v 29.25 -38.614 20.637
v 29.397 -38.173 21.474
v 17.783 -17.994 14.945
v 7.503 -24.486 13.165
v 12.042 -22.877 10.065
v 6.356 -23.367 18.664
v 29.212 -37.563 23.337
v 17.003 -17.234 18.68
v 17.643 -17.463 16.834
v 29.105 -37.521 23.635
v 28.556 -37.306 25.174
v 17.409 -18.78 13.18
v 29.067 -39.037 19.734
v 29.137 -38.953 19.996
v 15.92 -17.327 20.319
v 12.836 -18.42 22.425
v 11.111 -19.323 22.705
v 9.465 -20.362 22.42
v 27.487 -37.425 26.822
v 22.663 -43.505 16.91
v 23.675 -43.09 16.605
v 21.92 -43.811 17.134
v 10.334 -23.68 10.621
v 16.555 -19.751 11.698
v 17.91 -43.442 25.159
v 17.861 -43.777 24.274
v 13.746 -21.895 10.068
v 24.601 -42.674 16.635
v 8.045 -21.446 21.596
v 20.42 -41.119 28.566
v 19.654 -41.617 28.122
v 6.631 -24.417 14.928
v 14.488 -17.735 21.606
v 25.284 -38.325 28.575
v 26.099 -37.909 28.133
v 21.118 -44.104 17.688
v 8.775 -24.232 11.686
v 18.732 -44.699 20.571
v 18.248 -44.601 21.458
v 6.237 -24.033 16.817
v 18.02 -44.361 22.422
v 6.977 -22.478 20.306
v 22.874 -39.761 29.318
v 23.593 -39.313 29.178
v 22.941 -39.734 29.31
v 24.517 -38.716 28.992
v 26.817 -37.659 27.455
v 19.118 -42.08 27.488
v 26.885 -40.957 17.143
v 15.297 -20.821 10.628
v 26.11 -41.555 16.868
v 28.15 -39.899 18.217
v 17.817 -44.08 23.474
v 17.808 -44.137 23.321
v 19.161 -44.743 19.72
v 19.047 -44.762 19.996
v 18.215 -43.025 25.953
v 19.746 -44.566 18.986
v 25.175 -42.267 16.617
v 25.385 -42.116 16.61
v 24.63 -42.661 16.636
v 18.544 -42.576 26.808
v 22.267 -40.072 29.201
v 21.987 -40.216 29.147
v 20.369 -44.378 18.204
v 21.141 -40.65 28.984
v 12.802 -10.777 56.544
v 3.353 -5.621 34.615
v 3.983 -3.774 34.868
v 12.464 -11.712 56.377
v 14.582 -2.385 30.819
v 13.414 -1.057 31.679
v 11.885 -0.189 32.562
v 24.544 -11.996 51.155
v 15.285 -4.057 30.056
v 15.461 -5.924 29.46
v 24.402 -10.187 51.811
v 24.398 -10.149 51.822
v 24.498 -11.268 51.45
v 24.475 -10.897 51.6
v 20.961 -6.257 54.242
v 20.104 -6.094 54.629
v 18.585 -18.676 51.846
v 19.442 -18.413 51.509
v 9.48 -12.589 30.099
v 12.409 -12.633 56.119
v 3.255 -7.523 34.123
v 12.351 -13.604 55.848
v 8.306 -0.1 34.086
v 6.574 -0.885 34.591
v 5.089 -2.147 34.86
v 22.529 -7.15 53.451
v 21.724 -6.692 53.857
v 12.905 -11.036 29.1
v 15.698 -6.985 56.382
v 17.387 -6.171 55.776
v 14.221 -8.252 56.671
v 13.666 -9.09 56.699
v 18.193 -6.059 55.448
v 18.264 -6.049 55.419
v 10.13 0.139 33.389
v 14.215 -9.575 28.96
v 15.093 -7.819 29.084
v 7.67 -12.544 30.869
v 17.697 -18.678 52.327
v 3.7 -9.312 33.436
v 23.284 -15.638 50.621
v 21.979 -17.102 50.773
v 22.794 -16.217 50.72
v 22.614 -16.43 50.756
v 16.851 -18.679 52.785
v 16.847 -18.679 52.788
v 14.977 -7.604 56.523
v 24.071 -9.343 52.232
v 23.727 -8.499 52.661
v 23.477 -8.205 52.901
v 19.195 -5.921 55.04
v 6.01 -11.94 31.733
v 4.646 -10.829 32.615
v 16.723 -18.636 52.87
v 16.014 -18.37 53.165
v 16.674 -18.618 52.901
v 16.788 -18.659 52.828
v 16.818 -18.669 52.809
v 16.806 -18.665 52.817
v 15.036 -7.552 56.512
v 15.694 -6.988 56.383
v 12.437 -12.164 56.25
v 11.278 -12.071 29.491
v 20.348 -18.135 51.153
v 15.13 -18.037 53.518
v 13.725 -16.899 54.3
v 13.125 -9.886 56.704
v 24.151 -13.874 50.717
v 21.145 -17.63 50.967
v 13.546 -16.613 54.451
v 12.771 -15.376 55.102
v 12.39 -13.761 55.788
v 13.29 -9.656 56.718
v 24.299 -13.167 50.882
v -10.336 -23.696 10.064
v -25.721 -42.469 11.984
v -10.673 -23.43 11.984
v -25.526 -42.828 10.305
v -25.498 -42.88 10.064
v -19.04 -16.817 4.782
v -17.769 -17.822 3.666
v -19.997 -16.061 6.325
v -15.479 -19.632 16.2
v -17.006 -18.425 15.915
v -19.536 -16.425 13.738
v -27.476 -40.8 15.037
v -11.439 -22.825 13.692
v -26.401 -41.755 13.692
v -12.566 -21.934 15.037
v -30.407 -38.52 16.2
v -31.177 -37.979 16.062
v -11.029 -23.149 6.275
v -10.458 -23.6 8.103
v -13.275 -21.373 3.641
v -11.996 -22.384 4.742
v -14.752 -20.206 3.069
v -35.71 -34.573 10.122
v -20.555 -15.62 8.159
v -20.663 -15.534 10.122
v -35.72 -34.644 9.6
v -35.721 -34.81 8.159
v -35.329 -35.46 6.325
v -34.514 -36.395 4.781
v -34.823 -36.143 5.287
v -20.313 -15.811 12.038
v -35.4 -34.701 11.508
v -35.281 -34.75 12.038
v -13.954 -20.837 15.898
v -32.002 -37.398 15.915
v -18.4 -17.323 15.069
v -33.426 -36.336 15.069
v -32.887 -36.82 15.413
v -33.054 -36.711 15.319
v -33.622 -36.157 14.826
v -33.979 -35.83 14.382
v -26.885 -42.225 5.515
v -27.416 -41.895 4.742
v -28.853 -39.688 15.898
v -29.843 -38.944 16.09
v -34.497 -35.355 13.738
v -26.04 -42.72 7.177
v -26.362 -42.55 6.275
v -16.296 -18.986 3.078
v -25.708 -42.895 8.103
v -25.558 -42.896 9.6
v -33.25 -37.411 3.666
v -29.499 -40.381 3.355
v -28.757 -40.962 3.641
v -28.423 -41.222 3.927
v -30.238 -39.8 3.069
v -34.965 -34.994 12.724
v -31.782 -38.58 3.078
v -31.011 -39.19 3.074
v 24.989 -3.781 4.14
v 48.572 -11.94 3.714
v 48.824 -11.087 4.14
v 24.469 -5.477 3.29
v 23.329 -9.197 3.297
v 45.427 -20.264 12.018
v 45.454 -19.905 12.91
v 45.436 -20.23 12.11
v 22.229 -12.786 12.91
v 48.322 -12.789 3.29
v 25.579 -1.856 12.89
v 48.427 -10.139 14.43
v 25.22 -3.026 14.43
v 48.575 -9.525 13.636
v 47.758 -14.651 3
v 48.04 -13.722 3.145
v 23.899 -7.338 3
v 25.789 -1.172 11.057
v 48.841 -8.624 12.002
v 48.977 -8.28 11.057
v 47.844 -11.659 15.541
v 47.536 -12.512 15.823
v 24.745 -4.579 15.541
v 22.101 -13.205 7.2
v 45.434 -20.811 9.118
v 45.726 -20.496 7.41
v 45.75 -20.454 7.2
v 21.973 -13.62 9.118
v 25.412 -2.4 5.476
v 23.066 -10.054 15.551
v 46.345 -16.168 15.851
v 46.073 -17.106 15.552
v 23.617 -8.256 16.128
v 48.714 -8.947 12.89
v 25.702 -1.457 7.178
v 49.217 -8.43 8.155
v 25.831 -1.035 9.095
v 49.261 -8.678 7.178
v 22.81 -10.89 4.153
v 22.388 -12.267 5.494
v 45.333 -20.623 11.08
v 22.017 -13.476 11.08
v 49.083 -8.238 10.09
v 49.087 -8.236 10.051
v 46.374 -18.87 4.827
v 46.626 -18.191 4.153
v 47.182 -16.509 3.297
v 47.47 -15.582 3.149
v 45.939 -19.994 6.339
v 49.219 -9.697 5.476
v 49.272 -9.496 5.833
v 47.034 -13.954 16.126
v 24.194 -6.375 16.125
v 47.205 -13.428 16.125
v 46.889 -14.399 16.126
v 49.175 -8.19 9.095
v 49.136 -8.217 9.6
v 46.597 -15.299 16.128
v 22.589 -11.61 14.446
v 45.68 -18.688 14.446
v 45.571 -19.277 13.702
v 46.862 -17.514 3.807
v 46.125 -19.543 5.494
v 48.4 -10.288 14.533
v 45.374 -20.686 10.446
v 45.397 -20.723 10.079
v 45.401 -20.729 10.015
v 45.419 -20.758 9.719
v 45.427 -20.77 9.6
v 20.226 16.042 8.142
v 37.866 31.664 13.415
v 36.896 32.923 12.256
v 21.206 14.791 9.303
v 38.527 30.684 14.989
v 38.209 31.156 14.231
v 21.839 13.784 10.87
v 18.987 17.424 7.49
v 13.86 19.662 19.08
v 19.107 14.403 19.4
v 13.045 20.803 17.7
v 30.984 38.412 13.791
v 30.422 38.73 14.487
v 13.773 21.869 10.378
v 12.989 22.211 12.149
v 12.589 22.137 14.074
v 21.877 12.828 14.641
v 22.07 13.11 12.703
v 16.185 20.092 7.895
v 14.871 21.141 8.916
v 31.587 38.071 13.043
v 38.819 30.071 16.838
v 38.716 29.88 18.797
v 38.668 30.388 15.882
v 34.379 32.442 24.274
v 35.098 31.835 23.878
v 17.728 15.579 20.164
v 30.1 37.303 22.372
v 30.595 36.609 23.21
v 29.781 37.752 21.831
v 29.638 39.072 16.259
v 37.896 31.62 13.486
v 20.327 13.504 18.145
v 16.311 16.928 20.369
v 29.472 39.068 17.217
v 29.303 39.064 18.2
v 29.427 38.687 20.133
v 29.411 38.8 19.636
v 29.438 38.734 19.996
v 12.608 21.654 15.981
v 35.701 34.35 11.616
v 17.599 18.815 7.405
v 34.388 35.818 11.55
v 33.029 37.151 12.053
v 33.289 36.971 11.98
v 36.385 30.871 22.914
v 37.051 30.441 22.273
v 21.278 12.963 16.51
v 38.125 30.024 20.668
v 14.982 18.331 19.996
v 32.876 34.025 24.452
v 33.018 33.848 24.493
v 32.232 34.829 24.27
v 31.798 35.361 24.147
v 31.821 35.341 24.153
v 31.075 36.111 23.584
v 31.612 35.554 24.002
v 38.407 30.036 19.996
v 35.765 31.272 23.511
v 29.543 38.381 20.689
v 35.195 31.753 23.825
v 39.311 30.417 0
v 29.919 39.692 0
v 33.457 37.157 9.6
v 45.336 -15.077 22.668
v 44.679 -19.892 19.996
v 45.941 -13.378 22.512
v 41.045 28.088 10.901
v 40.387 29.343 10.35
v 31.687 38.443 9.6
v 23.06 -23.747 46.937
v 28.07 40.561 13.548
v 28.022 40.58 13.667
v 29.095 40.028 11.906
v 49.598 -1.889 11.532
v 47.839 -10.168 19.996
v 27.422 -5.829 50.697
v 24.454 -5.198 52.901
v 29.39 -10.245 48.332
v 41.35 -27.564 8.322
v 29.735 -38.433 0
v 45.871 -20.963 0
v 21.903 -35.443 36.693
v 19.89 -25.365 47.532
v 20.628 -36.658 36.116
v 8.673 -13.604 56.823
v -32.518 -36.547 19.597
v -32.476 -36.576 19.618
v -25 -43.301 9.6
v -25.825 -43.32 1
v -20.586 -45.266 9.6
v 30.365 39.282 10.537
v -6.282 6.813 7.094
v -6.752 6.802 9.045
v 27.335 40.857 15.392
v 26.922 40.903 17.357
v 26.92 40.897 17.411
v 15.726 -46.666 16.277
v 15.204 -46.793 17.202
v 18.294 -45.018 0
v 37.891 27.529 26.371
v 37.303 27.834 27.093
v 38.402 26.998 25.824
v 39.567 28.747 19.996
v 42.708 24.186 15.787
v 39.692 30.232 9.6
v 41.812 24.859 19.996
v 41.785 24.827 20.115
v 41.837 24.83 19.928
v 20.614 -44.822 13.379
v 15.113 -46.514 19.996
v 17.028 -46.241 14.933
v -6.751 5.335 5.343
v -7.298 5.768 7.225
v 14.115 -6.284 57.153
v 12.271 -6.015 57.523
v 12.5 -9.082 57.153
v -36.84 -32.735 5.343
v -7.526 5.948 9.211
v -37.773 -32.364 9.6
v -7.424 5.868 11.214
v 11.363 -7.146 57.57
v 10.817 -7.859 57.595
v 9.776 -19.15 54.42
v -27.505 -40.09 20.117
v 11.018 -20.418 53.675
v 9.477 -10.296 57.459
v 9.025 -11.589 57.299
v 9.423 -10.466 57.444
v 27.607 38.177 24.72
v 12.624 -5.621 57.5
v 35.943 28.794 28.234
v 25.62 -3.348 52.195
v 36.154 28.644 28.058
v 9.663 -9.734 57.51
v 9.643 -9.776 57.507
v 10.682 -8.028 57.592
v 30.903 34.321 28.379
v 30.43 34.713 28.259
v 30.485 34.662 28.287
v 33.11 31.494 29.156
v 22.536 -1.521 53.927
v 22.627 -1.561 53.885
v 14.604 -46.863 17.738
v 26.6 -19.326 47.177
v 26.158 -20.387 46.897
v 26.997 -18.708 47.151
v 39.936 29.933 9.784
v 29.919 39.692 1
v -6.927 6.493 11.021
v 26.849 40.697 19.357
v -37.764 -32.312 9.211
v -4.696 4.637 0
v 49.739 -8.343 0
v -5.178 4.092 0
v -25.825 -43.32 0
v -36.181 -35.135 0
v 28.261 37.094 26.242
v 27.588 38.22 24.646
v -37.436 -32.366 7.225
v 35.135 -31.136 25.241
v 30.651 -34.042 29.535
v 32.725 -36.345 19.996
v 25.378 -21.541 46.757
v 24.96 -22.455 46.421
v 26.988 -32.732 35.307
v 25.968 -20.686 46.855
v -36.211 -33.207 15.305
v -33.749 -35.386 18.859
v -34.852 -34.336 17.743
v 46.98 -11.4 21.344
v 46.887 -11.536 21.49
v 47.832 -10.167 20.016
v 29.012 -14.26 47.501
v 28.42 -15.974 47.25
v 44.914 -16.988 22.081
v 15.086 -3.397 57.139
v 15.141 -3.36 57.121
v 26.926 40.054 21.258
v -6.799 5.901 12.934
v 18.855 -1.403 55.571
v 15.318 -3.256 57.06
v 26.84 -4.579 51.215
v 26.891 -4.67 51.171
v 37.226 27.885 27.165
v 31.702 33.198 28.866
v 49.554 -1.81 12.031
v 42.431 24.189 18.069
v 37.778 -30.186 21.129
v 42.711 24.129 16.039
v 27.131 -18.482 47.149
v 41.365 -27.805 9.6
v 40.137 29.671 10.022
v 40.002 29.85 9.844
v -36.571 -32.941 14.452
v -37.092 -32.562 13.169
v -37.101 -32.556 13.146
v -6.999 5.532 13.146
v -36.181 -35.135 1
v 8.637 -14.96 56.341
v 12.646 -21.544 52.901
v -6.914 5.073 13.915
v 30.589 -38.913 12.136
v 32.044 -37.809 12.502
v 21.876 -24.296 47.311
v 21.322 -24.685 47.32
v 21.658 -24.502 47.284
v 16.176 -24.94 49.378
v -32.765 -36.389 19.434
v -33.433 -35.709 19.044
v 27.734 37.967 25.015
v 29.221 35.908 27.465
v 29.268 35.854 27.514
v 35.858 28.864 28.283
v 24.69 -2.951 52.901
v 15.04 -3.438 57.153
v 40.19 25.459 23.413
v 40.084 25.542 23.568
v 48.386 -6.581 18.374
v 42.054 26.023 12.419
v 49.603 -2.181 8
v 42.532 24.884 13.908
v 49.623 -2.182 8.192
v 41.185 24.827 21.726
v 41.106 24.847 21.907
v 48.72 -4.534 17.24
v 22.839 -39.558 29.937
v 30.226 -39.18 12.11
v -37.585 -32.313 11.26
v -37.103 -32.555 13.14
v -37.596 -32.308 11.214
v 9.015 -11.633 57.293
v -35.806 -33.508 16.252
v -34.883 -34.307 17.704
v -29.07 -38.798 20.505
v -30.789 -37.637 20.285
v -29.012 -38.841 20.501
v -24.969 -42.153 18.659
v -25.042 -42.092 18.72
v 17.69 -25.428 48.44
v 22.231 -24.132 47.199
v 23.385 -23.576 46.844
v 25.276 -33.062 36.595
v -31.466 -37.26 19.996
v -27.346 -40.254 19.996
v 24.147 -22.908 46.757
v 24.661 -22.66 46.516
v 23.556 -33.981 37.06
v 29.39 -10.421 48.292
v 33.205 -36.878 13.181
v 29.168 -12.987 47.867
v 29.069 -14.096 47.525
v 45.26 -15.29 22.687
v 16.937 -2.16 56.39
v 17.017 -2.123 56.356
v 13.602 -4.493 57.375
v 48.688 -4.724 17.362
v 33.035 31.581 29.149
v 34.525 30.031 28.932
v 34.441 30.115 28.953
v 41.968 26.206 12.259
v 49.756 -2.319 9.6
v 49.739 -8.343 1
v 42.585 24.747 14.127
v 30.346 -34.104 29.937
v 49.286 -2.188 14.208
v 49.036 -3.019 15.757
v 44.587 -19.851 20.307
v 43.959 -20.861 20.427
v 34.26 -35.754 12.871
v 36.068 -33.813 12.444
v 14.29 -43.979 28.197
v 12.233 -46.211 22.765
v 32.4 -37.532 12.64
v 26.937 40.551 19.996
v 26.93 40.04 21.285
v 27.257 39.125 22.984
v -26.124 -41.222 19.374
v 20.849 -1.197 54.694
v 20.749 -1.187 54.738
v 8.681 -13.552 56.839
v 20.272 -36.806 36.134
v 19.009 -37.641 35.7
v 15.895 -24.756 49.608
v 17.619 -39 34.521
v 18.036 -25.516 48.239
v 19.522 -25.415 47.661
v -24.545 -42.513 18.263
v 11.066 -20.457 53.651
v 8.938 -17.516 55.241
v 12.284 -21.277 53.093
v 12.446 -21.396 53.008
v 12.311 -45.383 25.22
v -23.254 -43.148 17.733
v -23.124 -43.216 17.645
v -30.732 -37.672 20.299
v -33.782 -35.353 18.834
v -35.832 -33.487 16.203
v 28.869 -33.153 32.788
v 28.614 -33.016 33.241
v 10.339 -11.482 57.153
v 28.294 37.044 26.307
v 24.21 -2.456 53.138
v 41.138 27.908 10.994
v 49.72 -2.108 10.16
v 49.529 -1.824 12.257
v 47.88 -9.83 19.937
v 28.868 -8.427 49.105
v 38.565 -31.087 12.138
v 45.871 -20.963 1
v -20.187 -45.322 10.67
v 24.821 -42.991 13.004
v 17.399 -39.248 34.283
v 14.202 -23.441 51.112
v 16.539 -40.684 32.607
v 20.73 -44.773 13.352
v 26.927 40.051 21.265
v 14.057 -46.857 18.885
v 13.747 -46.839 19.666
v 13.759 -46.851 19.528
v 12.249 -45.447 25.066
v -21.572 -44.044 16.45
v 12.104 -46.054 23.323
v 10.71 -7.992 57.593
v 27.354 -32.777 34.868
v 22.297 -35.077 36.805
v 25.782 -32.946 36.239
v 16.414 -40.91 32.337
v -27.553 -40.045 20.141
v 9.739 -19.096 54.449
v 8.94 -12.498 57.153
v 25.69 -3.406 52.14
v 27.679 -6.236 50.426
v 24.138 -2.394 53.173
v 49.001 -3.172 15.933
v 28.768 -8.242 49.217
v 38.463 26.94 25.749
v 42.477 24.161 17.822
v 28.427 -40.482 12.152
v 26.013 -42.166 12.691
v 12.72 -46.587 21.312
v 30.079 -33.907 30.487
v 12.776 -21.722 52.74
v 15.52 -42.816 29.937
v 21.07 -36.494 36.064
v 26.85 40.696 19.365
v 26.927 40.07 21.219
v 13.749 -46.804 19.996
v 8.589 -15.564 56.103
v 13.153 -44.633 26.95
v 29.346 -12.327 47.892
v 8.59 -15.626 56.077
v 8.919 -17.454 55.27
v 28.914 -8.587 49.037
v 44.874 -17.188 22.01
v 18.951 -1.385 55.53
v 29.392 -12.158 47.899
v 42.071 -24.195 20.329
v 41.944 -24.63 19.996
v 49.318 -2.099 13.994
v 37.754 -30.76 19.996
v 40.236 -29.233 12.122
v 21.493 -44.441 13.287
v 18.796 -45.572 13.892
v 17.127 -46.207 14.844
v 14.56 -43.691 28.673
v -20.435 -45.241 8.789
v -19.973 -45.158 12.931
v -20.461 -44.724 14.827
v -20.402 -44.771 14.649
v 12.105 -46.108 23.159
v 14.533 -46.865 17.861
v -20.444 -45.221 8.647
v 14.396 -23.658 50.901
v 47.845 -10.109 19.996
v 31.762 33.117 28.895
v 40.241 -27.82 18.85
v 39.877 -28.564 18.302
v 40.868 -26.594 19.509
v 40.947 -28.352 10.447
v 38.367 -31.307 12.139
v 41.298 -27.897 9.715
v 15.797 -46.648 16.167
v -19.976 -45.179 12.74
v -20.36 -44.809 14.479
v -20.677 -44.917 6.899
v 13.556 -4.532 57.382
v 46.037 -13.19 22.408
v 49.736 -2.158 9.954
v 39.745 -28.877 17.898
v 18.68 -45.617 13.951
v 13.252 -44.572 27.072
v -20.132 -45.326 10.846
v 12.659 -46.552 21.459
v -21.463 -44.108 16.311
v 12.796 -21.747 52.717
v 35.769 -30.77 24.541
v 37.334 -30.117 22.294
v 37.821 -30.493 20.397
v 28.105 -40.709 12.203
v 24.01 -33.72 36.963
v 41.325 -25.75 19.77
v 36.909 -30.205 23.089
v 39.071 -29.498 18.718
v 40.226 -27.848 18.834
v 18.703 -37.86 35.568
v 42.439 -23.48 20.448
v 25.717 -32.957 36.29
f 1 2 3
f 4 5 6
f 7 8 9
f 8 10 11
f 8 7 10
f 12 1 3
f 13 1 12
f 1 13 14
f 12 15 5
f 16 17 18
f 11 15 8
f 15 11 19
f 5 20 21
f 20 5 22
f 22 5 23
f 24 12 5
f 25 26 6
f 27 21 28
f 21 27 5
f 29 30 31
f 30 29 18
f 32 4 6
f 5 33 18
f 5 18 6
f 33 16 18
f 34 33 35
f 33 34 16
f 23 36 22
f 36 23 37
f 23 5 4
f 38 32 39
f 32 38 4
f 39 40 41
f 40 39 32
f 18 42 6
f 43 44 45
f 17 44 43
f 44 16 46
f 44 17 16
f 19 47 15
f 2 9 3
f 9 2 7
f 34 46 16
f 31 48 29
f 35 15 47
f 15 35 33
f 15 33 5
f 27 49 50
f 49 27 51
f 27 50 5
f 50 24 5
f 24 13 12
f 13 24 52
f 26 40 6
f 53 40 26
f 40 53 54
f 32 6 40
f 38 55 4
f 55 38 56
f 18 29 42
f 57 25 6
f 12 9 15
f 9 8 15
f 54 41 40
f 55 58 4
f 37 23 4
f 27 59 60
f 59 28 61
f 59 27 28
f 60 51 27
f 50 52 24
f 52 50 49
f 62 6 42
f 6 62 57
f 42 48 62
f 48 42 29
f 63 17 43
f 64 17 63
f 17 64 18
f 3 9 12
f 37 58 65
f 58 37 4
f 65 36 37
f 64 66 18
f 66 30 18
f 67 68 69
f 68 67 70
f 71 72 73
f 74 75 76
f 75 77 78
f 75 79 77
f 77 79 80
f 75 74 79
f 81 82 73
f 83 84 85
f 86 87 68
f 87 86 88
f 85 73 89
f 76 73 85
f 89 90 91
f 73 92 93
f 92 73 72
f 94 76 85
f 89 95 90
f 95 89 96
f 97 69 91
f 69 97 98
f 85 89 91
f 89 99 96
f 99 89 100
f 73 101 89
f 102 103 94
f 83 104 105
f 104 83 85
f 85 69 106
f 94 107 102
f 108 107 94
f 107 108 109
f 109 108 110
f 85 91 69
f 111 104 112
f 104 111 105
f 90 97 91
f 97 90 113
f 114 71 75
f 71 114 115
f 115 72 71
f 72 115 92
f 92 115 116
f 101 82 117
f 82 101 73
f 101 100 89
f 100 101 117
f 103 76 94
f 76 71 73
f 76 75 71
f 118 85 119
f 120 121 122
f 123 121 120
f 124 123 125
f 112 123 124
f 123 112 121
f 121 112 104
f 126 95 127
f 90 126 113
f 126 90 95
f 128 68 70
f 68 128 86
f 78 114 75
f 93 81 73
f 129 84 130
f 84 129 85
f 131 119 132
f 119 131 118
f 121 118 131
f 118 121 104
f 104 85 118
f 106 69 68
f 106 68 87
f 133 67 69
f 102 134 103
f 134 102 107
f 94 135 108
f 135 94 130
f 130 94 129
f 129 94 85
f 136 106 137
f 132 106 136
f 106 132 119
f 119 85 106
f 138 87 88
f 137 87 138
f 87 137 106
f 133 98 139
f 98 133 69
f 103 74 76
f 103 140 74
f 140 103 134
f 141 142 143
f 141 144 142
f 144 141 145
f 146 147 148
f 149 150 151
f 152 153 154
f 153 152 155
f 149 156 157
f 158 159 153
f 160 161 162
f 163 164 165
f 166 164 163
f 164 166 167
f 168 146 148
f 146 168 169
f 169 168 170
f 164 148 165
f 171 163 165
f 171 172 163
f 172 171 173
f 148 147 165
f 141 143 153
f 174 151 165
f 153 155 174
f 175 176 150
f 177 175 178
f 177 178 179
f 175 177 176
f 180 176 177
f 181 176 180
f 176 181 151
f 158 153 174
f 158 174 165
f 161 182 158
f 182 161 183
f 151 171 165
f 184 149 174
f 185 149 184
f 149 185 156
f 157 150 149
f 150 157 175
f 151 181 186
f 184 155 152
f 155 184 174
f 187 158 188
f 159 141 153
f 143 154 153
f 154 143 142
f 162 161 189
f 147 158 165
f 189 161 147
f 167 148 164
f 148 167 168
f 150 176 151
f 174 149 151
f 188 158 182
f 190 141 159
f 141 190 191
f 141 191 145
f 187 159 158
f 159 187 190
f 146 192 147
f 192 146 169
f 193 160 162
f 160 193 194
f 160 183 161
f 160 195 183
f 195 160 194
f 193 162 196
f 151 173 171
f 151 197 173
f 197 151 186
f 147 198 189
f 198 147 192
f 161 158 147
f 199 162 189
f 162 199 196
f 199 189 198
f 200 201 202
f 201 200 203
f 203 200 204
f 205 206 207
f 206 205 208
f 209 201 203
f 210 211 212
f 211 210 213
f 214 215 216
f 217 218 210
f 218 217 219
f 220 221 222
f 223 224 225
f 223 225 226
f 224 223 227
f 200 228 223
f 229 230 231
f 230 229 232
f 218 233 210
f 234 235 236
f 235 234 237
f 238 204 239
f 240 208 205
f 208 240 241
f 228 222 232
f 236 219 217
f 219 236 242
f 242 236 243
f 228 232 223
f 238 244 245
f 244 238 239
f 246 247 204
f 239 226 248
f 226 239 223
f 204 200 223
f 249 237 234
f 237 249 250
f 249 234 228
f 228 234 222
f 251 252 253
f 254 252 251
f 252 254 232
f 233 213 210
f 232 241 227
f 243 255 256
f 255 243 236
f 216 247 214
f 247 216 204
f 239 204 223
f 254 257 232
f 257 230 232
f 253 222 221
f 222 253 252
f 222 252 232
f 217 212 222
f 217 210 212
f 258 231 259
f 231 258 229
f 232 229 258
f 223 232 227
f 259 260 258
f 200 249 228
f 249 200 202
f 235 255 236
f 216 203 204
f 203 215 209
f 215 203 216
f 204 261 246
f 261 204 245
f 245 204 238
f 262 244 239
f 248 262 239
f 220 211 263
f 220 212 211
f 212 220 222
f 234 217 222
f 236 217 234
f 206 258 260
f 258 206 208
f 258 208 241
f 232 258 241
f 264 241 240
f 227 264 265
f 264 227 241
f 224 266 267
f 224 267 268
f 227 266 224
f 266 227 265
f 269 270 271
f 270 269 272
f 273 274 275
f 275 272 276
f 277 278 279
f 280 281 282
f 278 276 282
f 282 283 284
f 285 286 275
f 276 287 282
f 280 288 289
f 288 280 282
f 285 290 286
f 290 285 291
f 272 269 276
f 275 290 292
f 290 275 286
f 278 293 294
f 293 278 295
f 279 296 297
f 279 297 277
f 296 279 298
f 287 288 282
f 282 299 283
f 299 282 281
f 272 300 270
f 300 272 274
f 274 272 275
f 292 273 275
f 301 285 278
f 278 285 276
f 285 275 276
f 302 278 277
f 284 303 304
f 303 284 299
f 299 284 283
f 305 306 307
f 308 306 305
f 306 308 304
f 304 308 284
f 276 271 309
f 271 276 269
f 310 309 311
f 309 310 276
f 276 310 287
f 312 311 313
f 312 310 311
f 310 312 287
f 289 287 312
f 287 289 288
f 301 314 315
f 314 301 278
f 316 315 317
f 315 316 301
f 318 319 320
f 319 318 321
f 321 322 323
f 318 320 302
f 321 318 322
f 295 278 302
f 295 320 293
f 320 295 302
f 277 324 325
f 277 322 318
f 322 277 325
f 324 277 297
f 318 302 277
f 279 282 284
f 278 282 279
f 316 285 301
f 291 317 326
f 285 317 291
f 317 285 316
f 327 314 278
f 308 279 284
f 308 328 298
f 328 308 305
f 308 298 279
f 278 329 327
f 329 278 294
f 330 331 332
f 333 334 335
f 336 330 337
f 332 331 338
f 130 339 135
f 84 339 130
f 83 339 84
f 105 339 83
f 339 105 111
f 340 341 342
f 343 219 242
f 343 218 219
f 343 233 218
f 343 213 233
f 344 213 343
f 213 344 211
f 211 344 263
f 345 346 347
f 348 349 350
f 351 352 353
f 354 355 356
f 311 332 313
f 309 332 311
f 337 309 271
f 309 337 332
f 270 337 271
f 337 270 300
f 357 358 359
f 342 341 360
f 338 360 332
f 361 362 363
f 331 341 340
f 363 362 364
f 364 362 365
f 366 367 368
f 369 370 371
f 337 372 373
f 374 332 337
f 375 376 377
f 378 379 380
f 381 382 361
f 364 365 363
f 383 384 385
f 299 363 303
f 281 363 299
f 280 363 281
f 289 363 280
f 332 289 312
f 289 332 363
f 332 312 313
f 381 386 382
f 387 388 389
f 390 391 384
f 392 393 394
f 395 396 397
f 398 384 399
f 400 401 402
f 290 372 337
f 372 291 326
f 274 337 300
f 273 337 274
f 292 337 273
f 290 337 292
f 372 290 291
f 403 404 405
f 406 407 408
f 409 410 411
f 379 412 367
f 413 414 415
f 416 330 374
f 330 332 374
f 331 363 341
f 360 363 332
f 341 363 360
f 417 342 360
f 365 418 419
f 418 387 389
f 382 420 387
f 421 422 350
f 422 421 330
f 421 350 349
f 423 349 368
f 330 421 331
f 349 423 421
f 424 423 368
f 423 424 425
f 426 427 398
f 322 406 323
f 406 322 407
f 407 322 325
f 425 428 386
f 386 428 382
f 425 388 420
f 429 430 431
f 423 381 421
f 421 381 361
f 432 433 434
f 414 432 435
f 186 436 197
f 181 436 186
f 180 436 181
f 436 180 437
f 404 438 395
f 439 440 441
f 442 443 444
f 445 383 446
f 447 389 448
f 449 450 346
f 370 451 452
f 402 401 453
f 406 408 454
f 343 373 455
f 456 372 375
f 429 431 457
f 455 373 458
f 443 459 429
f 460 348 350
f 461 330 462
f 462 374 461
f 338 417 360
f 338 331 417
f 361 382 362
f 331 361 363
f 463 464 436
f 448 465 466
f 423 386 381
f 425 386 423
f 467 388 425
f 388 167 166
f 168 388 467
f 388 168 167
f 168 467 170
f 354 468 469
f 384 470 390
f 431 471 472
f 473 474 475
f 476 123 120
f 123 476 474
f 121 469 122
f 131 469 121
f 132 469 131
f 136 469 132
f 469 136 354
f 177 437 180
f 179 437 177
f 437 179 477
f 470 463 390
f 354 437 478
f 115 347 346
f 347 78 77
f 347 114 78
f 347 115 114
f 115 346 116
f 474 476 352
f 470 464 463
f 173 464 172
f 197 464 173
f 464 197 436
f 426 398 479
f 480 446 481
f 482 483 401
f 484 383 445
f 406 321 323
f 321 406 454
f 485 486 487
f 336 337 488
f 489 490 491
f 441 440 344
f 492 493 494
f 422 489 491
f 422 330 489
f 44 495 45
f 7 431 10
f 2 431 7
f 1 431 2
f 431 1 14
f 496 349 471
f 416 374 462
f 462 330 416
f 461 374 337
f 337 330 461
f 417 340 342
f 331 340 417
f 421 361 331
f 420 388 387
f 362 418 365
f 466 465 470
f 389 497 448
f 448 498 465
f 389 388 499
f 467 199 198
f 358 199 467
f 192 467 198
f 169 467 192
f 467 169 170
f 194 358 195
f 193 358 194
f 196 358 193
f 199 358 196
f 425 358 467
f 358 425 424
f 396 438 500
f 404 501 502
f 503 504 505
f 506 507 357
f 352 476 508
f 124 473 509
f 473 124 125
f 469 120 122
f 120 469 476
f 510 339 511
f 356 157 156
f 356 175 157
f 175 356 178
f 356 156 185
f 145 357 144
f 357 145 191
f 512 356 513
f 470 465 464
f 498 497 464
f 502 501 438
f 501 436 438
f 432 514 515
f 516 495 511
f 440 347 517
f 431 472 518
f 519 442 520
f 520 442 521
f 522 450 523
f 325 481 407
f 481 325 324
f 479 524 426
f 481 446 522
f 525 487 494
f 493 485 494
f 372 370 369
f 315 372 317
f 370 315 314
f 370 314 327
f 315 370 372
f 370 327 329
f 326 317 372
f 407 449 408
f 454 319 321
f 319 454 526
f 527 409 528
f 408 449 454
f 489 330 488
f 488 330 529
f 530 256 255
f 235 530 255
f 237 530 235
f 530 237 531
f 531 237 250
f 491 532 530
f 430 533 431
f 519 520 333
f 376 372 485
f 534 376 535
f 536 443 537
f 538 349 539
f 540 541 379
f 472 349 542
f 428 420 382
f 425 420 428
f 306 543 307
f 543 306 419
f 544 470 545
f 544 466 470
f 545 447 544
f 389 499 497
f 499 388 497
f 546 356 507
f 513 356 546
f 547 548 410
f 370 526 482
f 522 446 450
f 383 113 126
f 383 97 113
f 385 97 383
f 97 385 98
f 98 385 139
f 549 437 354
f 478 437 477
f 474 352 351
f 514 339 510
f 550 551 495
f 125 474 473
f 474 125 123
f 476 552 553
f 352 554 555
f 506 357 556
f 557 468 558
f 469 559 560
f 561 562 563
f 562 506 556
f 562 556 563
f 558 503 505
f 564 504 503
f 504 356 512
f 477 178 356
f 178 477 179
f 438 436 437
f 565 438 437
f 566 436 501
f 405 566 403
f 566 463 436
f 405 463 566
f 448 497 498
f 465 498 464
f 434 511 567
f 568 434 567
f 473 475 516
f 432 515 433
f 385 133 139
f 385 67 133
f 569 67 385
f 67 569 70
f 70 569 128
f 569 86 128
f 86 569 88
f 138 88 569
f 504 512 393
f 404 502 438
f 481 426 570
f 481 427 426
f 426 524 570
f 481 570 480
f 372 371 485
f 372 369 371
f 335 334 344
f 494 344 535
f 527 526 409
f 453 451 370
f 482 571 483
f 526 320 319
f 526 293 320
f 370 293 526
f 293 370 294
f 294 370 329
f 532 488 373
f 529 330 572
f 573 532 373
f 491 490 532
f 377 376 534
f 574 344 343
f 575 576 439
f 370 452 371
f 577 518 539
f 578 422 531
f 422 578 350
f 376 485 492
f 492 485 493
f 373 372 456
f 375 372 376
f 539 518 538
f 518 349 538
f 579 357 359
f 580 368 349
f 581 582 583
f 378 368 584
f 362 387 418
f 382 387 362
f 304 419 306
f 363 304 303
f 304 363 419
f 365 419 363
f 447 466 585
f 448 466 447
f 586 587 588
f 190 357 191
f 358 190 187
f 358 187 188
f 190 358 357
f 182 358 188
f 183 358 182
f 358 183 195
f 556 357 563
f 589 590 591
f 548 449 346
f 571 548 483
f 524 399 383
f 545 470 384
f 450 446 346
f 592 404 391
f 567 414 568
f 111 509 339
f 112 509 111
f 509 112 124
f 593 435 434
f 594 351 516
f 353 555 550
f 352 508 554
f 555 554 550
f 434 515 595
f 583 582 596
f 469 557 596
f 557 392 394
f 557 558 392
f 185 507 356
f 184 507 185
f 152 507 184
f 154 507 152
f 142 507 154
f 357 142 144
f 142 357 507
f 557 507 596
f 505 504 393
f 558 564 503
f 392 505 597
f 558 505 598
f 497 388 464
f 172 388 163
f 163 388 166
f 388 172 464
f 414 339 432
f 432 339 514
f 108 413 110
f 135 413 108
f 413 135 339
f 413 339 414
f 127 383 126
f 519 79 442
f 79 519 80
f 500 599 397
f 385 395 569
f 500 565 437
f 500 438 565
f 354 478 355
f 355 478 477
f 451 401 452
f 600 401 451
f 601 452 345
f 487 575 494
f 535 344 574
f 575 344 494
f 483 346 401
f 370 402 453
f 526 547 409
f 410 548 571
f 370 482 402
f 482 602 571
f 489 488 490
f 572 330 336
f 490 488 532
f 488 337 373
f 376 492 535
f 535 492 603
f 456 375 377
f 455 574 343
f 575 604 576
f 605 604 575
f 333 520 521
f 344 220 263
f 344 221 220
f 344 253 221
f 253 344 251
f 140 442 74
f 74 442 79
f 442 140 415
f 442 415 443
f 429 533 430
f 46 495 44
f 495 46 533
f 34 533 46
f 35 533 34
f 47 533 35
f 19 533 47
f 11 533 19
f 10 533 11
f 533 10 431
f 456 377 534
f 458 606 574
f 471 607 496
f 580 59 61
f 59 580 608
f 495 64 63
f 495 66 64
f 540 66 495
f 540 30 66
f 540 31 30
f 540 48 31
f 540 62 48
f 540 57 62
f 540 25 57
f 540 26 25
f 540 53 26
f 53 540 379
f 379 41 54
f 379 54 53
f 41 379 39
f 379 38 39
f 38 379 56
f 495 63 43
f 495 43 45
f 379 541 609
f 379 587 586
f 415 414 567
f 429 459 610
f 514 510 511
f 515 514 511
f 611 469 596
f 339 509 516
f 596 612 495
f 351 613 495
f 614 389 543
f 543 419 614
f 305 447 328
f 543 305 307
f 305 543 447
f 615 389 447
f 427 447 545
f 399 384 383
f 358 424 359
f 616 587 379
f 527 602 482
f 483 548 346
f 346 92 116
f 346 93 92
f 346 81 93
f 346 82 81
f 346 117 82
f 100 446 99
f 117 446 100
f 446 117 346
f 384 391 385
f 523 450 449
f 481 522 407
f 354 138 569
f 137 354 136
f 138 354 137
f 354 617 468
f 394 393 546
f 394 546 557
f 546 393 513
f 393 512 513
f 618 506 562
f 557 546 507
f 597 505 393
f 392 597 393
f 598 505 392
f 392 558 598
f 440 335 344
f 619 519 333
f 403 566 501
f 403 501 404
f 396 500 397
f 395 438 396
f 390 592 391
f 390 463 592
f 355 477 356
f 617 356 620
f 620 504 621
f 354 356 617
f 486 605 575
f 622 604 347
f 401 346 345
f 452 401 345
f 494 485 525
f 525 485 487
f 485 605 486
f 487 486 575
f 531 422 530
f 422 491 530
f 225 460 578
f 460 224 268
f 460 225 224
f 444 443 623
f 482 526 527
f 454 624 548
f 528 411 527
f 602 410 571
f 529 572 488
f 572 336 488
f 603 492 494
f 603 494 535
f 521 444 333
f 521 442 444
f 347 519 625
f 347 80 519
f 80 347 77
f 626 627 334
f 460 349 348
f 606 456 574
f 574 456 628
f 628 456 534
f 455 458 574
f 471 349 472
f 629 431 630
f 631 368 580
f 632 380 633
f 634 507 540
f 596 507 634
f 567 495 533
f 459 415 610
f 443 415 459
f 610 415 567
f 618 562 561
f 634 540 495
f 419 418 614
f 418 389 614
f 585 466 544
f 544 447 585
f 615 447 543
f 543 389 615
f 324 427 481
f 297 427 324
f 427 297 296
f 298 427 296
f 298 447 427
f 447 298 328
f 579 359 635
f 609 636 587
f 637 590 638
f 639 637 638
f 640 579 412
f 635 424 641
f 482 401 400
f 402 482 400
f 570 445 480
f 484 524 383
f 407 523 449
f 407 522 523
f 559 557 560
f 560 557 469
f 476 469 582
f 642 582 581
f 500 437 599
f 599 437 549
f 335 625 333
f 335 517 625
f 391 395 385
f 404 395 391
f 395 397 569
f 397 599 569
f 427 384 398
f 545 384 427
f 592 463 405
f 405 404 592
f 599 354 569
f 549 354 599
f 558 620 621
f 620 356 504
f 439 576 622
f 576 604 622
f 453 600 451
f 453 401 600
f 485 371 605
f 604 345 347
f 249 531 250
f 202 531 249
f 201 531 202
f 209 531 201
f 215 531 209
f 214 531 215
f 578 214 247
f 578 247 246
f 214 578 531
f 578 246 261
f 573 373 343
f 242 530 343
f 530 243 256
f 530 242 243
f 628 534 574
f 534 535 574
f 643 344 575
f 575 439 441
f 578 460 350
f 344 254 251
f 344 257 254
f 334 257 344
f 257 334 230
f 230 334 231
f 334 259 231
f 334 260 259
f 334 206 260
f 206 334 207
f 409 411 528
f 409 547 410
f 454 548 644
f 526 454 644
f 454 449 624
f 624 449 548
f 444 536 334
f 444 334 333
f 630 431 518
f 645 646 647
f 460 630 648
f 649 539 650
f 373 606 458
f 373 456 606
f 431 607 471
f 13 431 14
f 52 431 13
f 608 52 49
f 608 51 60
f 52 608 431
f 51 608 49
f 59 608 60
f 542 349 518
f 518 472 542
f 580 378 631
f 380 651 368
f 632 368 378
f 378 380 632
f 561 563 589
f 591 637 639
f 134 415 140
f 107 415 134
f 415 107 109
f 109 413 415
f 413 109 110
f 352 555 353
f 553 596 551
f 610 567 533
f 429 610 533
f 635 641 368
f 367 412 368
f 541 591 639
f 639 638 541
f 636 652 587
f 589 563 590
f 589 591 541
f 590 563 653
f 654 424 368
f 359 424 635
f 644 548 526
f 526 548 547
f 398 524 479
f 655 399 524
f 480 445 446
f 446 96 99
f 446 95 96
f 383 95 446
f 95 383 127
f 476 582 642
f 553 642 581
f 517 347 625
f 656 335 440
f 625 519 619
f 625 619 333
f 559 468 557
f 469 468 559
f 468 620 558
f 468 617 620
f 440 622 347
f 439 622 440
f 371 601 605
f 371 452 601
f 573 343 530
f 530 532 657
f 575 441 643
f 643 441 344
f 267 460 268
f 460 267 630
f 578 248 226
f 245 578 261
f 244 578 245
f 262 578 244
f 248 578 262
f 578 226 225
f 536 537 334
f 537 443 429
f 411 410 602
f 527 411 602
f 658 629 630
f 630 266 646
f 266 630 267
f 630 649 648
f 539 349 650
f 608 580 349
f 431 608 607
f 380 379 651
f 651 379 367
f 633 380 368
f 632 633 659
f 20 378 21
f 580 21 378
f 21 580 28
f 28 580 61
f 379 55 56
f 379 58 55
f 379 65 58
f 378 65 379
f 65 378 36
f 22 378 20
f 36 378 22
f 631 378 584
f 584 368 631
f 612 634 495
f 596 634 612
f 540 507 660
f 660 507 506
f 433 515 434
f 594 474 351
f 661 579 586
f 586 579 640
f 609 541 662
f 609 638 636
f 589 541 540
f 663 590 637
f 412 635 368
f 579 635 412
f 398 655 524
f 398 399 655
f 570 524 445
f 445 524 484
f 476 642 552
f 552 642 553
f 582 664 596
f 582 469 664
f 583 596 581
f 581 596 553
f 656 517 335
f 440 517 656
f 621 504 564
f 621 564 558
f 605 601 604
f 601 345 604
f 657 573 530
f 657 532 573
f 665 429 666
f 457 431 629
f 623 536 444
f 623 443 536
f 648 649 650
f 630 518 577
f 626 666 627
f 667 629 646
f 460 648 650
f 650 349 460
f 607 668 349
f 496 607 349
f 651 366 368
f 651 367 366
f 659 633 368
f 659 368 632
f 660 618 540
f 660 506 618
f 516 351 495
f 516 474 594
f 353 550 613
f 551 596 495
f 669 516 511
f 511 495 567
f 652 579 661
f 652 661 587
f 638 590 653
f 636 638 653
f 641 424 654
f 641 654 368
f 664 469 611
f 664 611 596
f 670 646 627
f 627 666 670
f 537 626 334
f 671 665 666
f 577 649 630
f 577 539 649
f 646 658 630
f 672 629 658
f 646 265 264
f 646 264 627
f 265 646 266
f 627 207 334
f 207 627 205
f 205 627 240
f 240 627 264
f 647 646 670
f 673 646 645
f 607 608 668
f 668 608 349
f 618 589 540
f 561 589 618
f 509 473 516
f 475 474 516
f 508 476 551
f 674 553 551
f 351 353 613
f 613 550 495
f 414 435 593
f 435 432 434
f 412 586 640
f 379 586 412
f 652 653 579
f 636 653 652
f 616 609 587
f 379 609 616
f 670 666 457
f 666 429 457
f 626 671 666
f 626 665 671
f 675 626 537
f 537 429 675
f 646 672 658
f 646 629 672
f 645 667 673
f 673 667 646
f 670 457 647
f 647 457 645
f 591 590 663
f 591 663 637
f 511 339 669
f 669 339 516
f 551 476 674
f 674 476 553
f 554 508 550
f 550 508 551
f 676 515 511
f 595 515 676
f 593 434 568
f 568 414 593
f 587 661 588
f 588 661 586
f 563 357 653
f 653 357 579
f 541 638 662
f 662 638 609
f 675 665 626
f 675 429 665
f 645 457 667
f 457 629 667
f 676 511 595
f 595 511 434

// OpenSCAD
difference() {
	hull() {
		union() {
			union() {
				rotate(a = -60.0779438569, v = [0, 0, 1]) {
					translate(v = [0, -6.6000000000, 0]) {
						cube(size = [48.1428843854, 13.2000000000, 1]);
					}
				}
				rotate(a = -33.7633078376, v = [0, 0, 1]) {
					translate(v = [0, -6.6000000000, 0]) {
						cube(size = [22.4897820967, 13.2000000000, 1]);
					}
				}
				rotate(a = -128.3206855074, v = [0, 0, 1]) {
					translate(v = [0, -6.6000000000, 0]) {
						cube(size = [50.0000000000, 13.2000000000, 1]);
					}
				}
				rotate(a = -17.0412365145, v = [0, 0, 1]) {
					translate(v = [0, -6.6000000000, 0]) {
						cube(size = [50.0000000000, 13.2000000000, 1]);
					}
				}
				rotate(a = 45.3615313863, v = [0, 0, 1]) {
					translate(v = [0, -6.6000000000, 0]) {
						cube(size = [49.2646057105, 13.2000000000, 1]);
					}
				}
			}
			translate(v = [0, 0, 9.6000000000]) {
				intersection() {
					hull() {
						rotate(a = 74.3351951875, v = [0.8345136407, 0.4802937659, -0.0000013148]) {
							cylinder(h = 50, r = 9.6000000000);
						}
						rotate(a = 26.7305575166, v = [0.2499808213, 0.3739324632, -0.0000006239]) {
							cylinder(h = 50, r = 9.6000000000);
						}
						rotate(a = 90.0000885264, v = [0.7845525604, -0.6200623194, -0.0000001645]) {
							cylinder(h = 50, r = 9.6000000000);
						}
						rotate(a = 89.9999582120, v = [0.2930598939, 0.9560940846, -0.0000012492]) {
							cylinder(h = 50, r = 9.6000000000);
						}
						rotate(a = 80.1610202101, v = [-0.7010888246, 0.6922965651, 0.0000000088]) {
							cylinder(h = 50, r = 9.6000000000);
						}
					}
					sphere(r = 50);
				}
			}
		}
	}
	translate(v = [0, 0, 9.6000000000]) {
		rotate(a = 74.3351951875, v = [0.8345136407, 0.4802937659, -0.0000013148]) {
			translate(v = [0, 0, 25]) {
				cylinder(h = 50, r = 6.6000000000);
			}
		}
		rotate(a = 26.7305575166, v = [0.2499808213, 0.3739324632, -0.0000006239]) {
			translate(v = [0, 0, 25]) {
				cylinder(h = 50, r = 6.6000000000);
			}
		}
		rotate(a = 90.0000885264, v = [0.7845525604, -0.6200623194, -0.0000001645]) {
			translate(v = [0, 0, 25]) {
				cylinder(h = 50, r = 6.6000000000);
			}
		}
		rotate(a = 89.9999582120, v = [0.2930598939, 0.9560940846, -0.0000012492]) {
			translate(v = [0, 0, 25]) {
				cylinder(h = 50, r = 6.6000000000);
			}
		}
		rotate(a = 80.1610202101, v = [-0.7010888246, 0.6922965651, 0.0000000088]) {
			translate(v = [0, 0, 25]) {
				cylinder(h = 50, r = 6.6000000000);
			}
		}
	}
}
